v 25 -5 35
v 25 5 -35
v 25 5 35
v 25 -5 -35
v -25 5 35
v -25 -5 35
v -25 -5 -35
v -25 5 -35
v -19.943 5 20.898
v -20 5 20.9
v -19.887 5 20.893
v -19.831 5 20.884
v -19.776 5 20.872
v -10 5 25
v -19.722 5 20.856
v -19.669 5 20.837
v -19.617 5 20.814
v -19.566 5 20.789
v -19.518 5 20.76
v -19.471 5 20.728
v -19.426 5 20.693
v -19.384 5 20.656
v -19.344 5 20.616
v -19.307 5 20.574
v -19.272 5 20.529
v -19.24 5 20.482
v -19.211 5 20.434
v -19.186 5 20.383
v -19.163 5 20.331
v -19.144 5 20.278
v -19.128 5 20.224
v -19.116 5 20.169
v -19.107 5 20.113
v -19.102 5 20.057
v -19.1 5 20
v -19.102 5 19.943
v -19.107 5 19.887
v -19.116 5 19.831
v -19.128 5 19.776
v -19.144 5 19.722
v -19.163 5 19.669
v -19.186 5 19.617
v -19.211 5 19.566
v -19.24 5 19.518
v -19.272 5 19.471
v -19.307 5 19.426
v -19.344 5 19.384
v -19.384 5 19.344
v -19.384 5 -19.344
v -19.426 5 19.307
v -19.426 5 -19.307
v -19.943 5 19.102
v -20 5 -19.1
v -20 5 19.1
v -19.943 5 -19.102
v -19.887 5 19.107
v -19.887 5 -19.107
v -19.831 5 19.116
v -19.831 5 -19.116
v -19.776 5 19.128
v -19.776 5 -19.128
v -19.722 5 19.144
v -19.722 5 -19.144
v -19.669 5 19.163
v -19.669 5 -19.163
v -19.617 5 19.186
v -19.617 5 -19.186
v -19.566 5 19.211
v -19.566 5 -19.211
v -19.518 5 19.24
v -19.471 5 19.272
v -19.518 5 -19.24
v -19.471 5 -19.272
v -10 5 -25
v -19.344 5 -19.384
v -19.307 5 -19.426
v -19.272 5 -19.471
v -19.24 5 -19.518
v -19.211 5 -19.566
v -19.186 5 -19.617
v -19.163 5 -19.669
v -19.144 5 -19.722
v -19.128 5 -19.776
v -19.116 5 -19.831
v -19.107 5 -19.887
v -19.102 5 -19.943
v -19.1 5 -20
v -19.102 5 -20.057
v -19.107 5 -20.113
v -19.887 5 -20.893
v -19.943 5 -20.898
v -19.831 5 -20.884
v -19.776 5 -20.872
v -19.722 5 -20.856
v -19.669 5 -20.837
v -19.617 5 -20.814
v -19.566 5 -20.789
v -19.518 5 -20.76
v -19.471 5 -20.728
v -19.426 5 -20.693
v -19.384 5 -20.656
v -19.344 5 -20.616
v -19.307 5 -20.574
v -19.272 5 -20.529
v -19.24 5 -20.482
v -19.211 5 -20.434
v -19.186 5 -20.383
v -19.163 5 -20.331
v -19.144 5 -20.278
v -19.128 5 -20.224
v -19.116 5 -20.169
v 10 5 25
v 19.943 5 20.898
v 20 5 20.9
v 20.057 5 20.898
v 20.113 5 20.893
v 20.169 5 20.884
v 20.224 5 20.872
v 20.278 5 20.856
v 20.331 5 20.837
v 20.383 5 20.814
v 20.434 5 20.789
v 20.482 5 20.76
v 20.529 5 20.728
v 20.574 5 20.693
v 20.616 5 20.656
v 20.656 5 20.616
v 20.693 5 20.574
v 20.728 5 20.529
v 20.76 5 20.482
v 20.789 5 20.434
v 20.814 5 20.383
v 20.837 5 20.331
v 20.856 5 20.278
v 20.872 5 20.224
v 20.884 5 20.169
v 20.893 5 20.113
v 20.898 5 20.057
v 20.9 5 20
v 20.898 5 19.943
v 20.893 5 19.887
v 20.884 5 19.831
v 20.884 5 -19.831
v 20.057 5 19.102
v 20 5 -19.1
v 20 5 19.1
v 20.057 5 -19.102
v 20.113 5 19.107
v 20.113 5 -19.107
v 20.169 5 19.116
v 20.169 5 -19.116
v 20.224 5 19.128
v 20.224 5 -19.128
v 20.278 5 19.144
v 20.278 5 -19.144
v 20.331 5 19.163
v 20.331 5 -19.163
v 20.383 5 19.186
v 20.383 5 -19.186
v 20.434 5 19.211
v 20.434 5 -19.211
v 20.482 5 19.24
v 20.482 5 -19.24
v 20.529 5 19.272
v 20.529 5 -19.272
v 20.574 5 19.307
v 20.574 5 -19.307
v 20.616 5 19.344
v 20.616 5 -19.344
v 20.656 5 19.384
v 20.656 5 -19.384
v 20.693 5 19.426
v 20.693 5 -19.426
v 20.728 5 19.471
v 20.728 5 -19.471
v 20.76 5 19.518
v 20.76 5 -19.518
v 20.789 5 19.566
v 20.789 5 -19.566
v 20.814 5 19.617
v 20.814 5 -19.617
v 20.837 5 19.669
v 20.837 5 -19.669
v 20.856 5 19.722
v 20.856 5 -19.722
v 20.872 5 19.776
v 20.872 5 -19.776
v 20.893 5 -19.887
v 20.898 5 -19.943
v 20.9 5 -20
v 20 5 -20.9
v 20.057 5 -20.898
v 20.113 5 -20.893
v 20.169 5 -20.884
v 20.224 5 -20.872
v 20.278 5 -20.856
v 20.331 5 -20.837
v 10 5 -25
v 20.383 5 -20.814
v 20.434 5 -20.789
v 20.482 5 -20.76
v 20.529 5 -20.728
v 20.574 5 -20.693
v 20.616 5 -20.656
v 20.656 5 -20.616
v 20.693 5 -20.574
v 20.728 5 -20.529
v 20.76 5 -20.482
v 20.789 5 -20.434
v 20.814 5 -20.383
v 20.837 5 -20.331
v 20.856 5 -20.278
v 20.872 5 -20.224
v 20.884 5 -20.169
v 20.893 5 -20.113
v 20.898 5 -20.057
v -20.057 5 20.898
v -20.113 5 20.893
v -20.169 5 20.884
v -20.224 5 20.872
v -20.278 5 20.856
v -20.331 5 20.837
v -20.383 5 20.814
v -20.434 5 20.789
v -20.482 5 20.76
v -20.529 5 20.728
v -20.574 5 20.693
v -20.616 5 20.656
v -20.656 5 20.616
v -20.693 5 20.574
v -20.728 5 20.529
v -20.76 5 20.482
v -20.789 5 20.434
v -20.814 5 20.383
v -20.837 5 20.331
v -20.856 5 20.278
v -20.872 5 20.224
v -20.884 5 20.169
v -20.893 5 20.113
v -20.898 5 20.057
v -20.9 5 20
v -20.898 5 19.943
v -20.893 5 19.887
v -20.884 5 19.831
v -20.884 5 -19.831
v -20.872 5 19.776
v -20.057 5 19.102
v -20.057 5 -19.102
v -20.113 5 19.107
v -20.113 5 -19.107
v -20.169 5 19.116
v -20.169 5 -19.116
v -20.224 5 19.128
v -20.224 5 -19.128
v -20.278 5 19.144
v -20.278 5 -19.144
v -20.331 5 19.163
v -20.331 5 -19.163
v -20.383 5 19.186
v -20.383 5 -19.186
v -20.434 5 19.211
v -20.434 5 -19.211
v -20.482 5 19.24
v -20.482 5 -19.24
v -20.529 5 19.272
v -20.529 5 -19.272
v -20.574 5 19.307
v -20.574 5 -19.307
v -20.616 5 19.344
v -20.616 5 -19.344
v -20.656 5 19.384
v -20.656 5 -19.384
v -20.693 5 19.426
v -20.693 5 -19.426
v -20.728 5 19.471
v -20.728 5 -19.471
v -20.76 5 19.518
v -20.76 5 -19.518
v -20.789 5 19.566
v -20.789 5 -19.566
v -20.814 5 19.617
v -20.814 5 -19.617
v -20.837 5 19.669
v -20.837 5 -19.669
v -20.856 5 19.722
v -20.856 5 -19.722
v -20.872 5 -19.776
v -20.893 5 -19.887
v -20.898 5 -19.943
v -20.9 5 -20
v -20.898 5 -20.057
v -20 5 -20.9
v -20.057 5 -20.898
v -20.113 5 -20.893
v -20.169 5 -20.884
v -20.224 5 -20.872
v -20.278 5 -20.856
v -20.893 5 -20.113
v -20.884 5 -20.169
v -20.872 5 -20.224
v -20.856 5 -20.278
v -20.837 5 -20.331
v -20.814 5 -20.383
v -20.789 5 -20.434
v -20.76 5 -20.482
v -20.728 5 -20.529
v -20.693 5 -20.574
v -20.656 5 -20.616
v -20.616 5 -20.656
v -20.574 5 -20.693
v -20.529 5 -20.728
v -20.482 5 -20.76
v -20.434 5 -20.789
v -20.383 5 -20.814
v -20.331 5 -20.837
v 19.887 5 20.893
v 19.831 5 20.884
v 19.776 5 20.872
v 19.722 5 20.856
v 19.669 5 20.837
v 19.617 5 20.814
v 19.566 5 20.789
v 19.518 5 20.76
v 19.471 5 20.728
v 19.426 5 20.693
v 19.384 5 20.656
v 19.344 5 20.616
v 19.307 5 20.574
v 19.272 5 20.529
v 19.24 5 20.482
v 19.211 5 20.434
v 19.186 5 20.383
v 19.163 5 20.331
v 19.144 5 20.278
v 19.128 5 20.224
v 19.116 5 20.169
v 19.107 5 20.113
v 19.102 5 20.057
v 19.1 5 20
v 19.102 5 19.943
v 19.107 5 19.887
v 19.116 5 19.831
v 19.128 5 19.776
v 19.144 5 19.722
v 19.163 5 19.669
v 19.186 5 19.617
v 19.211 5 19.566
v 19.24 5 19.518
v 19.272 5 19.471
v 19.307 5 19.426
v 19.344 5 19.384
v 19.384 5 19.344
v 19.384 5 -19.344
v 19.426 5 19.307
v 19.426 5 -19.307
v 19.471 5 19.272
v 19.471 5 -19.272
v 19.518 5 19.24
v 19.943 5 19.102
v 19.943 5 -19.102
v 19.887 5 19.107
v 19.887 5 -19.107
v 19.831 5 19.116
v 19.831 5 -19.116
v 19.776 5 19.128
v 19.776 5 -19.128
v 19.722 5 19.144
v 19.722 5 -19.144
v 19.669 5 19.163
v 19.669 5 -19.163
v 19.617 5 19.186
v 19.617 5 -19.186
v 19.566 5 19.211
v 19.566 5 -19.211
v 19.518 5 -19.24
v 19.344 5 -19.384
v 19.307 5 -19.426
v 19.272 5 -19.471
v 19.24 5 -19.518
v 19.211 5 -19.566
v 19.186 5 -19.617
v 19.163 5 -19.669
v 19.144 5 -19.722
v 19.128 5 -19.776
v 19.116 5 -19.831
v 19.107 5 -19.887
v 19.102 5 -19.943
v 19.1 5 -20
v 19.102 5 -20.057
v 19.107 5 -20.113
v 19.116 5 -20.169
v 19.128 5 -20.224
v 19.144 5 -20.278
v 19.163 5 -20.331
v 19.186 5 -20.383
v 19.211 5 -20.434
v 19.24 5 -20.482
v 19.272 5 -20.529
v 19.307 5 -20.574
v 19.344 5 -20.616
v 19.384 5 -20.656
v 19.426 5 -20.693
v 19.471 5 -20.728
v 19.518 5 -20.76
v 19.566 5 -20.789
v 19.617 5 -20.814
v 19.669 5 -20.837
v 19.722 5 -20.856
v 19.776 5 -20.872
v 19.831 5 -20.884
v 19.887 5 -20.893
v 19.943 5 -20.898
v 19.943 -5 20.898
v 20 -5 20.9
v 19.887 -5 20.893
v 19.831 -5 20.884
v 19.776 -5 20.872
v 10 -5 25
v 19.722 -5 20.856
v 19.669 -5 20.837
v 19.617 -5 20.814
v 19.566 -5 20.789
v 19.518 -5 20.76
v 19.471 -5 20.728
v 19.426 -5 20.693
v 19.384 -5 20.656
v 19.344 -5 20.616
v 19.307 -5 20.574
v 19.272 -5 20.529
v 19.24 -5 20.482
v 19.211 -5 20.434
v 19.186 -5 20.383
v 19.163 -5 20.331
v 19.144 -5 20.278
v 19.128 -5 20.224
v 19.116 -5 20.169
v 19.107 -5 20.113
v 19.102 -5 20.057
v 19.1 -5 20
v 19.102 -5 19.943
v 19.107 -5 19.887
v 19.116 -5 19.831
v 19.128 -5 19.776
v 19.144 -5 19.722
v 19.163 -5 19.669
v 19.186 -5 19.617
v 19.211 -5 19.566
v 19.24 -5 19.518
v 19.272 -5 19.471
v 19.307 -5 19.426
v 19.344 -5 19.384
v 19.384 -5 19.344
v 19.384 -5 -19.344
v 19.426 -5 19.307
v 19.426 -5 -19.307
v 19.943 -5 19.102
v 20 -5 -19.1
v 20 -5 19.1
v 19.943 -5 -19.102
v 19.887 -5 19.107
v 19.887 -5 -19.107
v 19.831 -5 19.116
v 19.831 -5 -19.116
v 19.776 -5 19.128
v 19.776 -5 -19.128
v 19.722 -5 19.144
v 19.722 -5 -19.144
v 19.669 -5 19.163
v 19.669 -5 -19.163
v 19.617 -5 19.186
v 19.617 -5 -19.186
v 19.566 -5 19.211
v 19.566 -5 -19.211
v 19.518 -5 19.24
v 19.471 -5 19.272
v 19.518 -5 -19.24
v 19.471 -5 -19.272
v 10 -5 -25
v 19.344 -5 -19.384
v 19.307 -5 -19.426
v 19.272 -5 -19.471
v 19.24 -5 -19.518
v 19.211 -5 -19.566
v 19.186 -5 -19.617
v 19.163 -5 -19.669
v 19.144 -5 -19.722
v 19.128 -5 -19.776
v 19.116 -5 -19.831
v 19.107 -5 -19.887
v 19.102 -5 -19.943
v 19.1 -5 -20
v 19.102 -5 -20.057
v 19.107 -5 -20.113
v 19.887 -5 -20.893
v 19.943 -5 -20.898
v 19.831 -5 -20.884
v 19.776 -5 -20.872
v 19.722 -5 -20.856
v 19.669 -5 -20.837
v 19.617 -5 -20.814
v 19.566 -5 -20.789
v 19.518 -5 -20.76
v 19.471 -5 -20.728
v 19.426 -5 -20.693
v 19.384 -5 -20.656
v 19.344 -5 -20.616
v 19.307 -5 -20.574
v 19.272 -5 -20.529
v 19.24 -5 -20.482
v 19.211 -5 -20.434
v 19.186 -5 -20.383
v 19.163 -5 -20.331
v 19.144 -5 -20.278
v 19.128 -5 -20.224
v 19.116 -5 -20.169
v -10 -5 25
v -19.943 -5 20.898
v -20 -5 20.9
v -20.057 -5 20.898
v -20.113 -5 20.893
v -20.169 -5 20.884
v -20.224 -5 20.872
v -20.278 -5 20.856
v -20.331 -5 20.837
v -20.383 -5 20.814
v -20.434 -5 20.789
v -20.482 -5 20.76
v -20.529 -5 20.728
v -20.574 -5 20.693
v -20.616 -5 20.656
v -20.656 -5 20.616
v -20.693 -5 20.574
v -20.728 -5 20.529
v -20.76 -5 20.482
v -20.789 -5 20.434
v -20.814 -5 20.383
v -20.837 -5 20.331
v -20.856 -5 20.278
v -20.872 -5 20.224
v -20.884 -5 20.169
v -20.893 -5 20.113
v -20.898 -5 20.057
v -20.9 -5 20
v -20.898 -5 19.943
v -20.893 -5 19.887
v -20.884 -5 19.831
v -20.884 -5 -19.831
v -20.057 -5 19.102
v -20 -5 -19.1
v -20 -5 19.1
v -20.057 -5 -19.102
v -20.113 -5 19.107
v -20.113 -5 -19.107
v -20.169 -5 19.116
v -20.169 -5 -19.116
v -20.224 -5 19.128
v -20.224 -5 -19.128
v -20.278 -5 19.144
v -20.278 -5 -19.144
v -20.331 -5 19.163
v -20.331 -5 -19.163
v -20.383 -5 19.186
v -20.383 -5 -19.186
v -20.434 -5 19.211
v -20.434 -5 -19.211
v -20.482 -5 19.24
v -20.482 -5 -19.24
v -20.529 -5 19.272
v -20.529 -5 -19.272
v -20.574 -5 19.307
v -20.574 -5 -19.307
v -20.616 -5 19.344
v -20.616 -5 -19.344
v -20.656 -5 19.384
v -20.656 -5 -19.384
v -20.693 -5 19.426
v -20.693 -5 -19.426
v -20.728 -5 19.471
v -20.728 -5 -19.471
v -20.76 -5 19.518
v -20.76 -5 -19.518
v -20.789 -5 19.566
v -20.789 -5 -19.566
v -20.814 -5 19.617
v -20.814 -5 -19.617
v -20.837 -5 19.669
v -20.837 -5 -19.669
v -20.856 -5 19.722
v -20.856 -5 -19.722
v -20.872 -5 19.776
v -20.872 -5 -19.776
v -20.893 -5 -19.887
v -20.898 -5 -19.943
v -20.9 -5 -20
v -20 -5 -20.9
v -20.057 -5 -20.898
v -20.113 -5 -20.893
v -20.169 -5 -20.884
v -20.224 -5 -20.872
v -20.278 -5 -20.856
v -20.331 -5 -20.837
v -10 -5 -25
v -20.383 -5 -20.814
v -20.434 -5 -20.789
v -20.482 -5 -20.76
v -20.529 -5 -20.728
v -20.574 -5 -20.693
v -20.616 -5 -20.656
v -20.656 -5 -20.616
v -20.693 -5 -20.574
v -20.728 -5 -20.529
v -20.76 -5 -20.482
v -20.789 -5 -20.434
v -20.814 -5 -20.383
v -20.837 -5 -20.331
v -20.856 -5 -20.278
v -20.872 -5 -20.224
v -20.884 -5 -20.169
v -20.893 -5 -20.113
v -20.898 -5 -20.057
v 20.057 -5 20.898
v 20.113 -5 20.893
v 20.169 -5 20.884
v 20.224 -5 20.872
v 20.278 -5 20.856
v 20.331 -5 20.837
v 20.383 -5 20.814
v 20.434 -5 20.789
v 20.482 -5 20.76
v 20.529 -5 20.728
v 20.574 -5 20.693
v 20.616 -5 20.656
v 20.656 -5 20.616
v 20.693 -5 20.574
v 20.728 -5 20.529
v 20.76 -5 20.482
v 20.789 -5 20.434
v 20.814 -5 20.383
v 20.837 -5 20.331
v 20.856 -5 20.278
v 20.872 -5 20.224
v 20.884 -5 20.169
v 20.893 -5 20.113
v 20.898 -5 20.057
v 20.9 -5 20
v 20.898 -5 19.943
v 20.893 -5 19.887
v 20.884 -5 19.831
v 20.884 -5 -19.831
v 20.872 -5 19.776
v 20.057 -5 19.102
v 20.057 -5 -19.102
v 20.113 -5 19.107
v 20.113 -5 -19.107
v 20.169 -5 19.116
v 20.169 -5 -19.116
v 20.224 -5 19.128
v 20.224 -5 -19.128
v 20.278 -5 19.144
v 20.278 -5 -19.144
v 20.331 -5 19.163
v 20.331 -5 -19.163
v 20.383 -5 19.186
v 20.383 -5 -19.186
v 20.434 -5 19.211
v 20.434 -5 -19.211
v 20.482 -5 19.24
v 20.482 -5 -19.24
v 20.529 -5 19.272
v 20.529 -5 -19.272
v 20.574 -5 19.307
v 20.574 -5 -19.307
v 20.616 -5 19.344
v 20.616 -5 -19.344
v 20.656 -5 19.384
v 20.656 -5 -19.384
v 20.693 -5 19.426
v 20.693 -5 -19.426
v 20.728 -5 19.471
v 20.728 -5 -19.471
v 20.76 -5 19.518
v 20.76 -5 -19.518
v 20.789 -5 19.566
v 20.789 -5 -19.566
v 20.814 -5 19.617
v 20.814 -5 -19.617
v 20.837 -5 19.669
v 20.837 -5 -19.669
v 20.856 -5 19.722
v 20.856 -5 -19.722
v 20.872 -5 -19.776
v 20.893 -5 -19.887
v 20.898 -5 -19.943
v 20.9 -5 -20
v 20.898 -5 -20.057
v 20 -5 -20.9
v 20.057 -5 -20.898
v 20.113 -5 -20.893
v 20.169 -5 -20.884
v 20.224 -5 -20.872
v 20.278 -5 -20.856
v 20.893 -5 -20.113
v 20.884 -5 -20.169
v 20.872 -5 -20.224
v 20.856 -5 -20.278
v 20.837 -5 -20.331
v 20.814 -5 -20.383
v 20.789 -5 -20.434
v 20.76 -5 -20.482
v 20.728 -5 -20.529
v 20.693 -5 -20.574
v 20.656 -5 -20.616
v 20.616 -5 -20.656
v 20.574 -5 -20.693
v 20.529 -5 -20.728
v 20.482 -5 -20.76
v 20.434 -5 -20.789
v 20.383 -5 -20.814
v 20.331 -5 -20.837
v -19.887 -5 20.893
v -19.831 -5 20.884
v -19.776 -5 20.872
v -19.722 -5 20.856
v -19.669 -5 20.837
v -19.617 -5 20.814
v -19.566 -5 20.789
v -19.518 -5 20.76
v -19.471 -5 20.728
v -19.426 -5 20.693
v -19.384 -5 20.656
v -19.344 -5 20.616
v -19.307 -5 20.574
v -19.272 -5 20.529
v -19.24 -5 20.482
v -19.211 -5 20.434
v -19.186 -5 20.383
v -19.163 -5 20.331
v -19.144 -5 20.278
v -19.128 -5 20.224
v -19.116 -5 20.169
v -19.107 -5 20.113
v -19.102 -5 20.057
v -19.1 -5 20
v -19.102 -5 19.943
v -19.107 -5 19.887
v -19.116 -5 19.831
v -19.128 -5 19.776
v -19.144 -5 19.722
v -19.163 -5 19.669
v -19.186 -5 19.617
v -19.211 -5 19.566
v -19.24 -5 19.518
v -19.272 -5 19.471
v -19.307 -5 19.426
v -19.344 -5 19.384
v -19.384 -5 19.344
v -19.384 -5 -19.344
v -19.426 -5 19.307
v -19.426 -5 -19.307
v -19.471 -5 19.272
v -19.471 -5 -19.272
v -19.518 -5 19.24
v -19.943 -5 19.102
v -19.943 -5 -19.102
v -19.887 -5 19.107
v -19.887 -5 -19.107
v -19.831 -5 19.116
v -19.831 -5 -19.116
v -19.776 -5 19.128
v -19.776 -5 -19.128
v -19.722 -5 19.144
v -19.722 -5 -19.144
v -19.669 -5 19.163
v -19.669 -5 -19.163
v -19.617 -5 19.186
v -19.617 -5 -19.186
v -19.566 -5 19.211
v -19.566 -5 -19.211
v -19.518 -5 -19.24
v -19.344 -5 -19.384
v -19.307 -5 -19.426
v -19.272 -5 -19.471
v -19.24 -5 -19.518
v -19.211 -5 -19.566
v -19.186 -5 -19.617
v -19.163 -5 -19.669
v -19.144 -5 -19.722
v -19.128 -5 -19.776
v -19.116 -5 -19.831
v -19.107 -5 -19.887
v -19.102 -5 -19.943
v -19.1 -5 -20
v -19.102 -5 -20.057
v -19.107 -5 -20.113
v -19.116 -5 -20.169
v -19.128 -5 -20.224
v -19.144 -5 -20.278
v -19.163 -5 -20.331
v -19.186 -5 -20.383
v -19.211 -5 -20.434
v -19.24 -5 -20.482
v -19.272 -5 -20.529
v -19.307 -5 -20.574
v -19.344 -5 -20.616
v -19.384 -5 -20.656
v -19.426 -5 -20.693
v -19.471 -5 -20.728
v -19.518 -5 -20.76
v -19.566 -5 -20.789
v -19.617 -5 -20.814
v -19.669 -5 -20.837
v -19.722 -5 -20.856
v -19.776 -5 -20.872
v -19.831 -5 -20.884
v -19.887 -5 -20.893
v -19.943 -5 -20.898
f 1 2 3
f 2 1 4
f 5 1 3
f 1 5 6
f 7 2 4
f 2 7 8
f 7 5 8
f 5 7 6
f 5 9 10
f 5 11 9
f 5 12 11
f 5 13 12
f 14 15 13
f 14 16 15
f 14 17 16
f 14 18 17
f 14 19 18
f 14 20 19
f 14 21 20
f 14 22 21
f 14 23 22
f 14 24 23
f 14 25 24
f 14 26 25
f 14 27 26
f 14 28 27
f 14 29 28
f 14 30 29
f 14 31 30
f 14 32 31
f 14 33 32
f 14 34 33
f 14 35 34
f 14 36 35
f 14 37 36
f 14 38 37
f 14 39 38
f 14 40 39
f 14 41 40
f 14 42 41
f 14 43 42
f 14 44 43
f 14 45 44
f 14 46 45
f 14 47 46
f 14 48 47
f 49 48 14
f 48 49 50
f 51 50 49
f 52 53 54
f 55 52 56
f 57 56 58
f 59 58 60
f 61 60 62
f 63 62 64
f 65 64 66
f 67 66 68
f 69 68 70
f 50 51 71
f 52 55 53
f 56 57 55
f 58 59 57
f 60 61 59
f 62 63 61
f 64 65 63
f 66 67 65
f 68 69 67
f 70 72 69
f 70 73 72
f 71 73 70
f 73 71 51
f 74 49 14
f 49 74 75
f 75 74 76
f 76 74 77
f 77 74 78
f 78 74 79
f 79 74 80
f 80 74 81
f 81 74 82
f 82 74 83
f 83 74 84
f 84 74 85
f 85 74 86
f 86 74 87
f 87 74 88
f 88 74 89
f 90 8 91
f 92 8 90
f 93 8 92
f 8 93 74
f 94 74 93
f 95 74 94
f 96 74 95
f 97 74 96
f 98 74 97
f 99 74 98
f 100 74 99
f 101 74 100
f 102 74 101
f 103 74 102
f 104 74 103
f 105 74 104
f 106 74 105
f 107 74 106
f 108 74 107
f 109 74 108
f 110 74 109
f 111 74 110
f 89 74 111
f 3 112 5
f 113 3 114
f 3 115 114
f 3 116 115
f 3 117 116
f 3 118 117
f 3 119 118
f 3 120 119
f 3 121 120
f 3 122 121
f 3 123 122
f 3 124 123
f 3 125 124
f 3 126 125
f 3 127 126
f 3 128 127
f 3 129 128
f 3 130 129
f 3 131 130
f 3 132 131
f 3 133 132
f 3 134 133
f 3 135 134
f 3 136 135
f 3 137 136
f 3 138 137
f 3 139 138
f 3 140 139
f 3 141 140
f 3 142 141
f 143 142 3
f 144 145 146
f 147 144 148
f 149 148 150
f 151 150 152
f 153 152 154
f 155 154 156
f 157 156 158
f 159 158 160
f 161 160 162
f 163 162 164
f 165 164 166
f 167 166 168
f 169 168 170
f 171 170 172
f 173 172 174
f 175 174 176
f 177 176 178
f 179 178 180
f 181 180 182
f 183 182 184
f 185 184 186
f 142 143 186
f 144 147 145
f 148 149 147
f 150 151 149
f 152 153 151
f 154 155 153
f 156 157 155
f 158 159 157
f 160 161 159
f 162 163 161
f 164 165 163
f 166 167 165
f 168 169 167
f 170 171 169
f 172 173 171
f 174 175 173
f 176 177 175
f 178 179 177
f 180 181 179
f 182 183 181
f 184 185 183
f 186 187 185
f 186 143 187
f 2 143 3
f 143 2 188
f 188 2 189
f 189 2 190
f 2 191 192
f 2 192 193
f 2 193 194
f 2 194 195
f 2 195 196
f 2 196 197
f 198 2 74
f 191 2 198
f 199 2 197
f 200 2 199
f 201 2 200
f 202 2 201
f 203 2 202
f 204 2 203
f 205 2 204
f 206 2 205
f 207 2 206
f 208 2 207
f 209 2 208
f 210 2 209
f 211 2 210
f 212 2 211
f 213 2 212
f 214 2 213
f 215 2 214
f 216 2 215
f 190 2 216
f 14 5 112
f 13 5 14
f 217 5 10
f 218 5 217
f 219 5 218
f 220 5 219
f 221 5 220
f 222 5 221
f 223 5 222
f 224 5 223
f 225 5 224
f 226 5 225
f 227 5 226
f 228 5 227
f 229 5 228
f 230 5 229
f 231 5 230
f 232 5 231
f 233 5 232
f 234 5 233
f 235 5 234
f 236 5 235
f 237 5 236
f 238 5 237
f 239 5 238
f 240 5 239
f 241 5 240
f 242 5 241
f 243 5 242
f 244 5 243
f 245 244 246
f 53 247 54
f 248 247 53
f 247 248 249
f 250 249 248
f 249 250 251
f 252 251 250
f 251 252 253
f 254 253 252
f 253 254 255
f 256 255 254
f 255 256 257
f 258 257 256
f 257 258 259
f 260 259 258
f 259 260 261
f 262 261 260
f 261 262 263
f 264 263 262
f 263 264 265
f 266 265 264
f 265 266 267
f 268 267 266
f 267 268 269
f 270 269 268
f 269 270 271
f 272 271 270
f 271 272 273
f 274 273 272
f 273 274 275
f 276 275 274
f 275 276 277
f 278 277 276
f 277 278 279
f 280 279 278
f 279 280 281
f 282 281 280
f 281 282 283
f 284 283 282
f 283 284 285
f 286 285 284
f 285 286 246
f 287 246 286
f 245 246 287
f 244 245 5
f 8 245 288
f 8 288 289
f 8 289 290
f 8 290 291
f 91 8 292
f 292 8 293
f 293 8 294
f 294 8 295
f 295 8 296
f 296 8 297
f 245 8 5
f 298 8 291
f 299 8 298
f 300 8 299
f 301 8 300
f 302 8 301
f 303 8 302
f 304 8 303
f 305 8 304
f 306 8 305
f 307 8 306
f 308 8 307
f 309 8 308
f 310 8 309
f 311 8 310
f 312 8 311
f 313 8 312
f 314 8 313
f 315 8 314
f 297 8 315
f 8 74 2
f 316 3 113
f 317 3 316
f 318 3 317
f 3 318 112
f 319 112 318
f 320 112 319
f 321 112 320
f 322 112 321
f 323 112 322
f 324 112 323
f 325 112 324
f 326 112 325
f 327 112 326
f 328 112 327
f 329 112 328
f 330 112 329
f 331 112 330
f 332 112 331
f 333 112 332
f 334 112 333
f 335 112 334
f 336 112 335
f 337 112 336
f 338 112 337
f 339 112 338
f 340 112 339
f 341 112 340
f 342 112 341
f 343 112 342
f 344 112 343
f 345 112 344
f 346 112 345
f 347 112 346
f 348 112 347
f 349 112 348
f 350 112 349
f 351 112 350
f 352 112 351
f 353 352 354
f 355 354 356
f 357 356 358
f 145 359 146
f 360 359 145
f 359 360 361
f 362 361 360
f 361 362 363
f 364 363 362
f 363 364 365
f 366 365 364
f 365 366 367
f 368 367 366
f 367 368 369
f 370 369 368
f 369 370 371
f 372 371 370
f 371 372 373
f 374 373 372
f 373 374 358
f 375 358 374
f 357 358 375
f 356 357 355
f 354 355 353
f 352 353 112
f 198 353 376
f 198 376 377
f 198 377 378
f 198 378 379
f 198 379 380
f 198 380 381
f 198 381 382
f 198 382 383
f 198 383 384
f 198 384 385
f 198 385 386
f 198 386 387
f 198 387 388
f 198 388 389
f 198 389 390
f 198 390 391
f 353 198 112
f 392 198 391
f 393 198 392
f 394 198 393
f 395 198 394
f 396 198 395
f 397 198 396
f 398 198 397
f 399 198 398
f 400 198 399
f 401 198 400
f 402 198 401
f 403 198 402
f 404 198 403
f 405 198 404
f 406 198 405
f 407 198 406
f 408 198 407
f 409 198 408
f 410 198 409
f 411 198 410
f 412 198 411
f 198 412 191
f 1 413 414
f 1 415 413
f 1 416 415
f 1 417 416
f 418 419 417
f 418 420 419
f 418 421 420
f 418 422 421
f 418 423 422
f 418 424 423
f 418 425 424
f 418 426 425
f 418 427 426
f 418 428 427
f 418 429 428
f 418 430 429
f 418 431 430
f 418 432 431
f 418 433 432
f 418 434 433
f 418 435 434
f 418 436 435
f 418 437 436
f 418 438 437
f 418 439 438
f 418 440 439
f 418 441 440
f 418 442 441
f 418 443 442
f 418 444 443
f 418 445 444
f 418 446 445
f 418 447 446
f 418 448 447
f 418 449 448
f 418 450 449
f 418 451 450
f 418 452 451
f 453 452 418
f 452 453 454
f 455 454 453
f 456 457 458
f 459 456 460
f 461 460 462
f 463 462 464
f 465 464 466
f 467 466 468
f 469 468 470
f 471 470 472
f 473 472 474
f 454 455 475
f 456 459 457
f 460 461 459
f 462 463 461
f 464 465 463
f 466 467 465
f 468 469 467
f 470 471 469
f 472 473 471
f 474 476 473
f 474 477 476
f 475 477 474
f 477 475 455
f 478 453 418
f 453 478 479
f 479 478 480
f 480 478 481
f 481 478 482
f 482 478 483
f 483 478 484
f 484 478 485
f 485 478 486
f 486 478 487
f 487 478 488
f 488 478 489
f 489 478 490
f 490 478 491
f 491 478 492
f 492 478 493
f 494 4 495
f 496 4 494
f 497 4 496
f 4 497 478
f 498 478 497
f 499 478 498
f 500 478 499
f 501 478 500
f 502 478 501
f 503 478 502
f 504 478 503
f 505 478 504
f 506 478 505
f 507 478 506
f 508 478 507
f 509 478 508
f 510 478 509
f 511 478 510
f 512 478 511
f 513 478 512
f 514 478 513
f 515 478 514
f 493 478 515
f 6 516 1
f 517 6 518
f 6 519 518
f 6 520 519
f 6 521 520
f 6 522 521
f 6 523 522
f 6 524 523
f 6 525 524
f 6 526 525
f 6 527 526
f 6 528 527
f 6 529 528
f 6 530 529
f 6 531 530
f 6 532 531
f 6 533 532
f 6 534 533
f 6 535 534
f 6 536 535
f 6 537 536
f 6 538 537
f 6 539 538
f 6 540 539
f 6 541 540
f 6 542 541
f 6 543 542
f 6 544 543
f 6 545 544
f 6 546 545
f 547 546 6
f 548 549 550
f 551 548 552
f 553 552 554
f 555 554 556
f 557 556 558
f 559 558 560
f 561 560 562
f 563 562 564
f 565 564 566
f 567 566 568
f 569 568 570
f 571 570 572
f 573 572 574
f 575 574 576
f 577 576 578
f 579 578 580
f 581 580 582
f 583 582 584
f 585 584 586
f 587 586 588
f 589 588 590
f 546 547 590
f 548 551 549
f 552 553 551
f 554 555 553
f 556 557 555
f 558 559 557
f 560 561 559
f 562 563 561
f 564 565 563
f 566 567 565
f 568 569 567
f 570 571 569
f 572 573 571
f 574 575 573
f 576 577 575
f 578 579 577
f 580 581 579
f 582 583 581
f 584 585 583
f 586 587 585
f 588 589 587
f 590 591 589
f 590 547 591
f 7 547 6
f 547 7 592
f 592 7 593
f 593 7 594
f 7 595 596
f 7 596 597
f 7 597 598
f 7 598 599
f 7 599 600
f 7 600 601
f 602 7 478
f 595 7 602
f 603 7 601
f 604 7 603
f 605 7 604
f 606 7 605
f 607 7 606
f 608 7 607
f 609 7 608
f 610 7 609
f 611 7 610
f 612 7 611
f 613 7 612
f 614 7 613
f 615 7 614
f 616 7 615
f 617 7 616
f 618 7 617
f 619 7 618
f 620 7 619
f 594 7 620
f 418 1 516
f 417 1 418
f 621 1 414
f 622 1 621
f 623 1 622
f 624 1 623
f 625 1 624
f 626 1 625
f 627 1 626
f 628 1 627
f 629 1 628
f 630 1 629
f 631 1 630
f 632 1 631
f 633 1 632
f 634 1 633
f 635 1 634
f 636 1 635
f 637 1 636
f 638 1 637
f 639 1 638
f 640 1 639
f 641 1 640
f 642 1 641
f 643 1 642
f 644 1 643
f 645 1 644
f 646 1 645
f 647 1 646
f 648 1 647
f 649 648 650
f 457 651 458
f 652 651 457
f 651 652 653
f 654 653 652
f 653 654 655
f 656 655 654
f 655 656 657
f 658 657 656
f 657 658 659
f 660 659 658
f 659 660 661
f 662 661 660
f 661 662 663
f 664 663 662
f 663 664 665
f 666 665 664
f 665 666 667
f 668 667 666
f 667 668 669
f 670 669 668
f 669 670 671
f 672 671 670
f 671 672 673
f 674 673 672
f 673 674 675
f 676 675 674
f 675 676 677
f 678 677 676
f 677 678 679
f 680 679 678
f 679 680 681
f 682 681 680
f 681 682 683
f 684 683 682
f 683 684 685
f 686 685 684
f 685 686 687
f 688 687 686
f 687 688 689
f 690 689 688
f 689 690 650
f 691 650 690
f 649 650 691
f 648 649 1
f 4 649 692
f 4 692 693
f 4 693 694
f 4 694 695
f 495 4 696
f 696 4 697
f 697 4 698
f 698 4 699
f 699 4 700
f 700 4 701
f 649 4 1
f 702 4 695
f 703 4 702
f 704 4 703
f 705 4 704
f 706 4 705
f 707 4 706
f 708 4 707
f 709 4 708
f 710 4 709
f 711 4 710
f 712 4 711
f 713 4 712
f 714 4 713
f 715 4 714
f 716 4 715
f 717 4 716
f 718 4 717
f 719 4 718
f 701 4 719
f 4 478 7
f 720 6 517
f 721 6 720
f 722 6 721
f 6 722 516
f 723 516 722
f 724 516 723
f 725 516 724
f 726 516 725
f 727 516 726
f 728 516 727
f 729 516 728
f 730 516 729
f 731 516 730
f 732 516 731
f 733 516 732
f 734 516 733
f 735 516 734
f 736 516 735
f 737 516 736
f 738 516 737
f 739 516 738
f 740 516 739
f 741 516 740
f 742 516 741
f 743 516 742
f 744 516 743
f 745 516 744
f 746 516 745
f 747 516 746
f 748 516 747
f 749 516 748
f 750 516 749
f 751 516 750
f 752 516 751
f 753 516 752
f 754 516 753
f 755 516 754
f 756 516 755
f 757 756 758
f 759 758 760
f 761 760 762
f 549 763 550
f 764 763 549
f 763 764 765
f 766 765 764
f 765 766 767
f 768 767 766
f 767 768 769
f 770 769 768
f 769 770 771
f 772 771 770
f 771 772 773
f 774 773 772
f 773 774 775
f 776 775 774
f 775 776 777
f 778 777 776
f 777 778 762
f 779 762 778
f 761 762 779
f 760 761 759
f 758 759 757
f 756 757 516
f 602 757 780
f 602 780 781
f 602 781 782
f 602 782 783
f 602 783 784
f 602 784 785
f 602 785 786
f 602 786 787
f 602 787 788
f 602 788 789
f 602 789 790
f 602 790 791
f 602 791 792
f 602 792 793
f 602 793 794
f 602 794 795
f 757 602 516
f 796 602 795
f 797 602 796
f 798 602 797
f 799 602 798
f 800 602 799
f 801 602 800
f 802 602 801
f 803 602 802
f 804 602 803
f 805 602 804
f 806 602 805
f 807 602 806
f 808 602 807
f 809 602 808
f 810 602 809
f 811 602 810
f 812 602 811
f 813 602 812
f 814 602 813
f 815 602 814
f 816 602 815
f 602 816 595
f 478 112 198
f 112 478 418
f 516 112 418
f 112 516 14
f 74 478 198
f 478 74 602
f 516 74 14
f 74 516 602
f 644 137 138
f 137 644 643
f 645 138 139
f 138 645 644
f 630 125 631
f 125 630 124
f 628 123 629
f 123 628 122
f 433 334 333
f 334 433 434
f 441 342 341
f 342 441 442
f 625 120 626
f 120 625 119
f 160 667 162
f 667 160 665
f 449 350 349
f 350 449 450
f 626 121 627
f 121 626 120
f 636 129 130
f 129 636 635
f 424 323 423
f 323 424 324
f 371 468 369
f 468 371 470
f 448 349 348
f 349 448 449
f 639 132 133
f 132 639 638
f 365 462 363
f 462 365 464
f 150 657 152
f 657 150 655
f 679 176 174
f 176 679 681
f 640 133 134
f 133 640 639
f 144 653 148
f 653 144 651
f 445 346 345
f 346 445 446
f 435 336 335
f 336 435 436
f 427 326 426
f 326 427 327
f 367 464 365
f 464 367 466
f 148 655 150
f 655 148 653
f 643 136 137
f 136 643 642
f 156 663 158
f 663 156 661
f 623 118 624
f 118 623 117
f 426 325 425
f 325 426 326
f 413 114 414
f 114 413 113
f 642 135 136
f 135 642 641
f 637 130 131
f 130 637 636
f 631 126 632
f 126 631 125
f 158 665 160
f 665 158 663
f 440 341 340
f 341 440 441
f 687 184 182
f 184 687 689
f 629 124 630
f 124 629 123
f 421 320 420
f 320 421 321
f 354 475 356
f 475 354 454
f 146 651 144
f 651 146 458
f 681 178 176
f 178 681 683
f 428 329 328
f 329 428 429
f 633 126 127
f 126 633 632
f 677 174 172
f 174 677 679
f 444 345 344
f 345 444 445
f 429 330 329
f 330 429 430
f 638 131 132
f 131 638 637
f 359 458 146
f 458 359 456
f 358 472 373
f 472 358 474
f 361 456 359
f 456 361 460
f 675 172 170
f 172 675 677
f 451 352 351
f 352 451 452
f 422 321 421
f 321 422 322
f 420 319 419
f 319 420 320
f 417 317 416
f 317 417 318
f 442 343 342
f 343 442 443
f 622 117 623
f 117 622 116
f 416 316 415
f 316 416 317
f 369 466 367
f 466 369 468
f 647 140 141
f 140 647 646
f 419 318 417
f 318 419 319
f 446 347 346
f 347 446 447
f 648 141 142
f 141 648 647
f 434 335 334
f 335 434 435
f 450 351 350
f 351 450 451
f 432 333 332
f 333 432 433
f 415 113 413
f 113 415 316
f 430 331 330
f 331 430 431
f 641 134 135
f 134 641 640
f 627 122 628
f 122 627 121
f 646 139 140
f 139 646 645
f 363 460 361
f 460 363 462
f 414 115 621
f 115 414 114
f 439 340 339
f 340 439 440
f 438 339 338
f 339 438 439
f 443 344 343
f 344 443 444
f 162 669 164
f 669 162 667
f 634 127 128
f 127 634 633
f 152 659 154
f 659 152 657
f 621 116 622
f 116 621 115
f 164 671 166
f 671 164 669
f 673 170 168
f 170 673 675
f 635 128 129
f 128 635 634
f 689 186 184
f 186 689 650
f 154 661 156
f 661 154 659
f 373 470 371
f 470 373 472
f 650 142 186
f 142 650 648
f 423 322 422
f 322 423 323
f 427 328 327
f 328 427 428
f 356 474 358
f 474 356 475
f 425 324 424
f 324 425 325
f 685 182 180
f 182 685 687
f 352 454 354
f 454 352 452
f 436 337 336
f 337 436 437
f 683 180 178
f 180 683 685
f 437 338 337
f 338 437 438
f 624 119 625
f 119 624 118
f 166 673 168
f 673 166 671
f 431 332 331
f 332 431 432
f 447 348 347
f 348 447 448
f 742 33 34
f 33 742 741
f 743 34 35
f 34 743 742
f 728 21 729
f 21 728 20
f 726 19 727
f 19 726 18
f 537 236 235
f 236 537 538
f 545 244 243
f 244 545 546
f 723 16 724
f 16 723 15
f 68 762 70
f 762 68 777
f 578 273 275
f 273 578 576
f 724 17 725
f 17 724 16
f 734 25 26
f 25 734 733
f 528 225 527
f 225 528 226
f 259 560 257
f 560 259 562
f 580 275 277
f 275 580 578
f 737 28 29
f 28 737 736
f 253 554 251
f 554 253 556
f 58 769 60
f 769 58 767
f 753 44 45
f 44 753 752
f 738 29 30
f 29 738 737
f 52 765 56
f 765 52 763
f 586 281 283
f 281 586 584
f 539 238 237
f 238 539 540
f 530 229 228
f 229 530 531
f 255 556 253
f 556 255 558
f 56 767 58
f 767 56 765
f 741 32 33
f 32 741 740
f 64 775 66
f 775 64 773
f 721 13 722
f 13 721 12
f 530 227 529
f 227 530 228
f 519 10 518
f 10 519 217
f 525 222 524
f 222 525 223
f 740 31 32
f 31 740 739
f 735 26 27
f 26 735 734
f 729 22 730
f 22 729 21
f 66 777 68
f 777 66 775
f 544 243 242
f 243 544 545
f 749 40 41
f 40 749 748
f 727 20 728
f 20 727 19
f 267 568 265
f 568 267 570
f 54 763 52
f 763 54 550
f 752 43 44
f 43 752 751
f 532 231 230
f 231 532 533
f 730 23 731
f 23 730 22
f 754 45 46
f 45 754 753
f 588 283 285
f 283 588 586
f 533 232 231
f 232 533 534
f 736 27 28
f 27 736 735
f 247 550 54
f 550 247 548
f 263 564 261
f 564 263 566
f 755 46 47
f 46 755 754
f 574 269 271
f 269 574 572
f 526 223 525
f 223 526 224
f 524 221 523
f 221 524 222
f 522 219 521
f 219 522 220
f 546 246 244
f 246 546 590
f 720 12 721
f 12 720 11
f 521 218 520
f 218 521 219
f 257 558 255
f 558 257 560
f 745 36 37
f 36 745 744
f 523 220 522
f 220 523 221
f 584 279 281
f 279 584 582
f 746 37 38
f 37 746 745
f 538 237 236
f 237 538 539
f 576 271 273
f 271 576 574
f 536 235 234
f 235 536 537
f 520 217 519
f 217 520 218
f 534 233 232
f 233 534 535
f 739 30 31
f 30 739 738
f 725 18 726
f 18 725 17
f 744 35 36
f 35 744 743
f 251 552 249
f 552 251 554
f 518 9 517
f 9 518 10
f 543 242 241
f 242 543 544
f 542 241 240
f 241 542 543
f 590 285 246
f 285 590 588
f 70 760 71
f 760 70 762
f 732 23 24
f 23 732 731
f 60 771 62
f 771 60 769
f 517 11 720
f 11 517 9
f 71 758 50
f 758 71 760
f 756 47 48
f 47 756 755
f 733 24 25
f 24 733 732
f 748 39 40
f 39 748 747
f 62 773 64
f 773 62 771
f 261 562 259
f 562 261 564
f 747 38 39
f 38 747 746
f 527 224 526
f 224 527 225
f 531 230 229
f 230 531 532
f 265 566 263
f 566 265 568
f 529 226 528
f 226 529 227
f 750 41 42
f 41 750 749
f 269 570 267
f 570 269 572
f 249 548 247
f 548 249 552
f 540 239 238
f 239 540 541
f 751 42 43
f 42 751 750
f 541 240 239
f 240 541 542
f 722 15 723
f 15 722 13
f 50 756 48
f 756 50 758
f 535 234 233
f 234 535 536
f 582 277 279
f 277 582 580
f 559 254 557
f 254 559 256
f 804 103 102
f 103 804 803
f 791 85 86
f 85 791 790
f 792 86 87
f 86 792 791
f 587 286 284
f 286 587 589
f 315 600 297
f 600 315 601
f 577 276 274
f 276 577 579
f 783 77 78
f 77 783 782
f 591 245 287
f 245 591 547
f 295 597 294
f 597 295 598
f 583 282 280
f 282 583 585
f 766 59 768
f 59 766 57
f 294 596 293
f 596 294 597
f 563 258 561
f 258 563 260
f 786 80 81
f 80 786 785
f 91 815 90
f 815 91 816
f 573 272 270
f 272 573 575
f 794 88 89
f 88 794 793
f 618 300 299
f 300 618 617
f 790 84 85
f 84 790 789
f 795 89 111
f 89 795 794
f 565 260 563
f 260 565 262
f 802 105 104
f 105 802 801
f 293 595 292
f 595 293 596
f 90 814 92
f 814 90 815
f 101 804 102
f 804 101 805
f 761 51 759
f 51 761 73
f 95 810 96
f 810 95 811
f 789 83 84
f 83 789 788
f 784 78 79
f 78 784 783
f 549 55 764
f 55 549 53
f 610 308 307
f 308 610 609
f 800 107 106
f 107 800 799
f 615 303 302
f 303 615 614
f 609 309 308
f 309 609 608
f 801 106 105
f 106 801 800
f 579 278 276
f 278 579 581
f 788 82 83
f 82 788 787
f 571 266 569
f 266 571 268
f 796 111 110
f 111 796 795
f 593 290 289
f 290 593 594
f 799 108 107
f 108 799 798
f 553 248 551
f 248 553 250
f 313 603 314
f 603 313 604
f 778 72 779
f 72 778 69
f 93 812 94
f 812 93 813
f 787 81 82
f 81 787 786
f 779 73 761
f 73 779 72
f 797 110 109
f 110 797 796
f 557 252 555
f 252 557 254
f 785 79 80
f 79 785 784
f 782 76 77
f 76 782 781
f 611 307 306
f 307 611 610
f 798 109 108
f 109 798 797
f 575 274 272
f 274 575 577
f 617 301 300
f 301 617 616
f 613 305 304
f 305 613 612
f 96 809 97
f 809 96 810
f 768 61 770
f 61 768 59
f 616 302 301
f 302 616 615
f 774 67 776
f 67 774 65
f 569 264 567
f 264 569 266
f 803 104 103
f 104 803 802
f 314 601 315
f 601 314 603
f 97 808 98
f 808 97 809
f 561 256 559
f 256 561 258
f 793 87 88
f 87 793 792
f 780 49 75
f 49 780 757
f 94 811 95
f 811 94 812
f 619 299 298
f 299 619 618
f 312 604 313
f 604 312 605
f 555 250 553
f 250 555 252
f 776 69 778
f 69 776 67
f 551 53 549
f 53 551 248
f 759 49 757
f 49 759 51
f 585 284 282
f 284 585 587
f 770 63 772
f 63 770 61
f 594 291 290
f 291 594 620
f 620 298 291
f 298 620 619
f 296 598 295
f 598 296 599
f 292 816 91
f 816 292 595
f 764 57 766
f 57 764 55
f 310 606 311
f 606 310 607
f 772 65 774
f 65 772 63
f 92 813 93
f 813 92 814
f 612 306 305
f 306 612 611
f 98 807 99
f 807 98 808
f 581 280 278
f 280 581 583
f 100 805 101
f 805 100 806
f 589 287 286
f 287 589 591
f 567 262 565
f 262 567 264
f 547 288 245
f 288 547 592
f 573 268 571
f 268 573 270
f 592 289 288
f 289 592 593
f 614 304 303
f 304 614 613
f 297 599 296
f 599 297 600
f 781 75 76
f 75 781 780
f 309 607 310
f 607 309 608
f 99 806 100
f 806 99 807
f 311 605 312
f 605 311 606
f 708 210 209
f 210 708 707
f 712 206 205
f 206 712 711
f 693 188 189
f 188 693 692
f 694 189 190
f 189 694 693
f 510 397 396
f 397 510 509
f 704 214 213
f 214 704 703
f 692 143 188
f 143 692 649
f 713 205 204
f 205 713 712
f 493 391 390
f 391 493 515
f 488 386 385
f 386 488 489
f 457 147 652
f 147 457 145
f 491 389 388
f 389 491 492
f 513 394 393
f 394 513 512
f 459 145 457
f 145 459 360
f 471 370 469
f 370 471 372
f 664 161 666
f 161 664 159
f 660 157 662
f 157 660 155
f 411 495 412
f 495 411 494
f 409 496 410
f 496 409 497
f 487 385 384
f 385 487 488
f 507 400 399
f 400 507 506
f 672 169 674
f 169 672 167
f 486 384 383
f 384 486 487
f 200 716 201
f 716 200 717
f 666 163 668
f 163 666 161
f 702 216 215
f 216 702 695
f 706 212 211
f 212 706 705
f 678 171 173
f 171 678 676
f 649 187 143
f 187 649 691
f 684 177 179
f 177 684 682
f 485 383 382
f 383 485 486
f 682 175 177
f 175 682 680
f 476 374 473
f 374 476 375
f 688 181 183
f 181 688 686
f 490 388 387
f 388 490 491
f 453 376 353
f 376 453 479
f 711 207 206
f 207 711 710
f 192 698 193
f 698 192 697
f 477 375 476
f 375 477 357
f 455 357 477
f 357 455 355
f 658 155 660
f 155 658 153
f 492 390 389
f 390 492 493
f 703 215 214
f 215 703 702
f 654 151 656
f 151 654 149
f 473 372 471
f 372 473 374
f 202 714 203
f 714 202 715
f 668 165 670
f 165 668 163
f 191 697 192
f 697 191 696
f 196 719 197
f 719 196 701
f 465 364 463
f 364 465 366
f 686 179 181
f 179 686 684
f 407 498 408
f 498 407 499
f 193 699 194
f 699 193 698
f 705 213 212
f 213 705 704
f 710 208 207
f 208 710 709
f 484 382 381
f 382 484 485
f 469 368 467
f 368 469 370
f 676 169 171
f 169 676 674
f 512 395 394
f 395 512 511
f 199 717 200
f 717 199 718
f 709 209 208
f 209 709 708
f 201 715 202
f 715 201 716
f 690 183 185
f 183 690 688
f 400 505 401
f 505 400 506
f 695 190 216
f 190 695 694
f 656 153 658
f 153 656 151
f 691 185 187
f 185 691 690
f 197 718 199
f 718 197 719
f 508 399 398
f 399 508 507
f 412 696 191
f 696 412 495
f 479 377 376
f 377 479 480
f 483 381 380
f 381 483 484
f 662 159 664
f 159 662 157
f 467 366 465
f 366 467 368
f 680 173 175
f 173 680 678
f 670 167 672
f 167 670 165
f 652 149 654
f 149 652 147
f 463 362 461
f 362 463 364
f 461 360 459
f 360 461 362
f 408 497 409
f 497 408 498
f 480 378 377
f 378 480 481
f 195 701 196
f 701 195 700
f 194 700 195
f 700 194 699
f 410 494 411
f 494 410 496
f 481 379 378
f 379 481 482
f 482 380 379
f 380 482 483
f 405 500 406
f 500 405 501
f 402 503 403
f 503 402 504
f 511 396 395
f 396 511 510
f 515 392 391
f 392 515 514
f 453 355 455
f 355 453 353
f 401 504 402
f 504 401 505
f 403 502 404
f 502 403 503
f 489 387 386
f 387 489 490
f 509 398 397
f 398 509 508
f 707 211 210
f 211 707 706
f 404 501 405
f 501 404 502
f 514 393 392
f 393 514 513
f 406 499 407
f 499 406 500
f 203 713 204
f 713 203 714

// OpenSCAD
front_x = 50;
front_y = 10;
front_z = 70;

screw_hole_r = 0.9;

device_gap_x = 20;
device_gap_z = 50;

difference() {
	cube([front_x,front_y,front_z], true);

	cube([device_gap_x,15,device_gap_z], true);
    
	//Screw top left
	translate([20,0,20]) rotate ([90,0,0]) cylinder (h = (front_y + 5), r=screw_hole_r, center = true, $fn=100);
	//Screw bottom left
	translate([-20,0,20]) rotate ([90,0,0]) cylinder (h = (front_y + 5), r=screw_hole_r, center = true, $fn=100);
	//Screw bottom right
	translate([-20,0,-20]) rotate ([90,0,0]) cylinder (h = (front_y + 5), r=screw_hole_r, center = true, $fn=100);
	//Screw Top right
	translate([20,0,-20]) rotate ([90,0,0]) cylinder (h = (front_y + 5), r=screw_hole_r, center = true, $fn=100);

}
